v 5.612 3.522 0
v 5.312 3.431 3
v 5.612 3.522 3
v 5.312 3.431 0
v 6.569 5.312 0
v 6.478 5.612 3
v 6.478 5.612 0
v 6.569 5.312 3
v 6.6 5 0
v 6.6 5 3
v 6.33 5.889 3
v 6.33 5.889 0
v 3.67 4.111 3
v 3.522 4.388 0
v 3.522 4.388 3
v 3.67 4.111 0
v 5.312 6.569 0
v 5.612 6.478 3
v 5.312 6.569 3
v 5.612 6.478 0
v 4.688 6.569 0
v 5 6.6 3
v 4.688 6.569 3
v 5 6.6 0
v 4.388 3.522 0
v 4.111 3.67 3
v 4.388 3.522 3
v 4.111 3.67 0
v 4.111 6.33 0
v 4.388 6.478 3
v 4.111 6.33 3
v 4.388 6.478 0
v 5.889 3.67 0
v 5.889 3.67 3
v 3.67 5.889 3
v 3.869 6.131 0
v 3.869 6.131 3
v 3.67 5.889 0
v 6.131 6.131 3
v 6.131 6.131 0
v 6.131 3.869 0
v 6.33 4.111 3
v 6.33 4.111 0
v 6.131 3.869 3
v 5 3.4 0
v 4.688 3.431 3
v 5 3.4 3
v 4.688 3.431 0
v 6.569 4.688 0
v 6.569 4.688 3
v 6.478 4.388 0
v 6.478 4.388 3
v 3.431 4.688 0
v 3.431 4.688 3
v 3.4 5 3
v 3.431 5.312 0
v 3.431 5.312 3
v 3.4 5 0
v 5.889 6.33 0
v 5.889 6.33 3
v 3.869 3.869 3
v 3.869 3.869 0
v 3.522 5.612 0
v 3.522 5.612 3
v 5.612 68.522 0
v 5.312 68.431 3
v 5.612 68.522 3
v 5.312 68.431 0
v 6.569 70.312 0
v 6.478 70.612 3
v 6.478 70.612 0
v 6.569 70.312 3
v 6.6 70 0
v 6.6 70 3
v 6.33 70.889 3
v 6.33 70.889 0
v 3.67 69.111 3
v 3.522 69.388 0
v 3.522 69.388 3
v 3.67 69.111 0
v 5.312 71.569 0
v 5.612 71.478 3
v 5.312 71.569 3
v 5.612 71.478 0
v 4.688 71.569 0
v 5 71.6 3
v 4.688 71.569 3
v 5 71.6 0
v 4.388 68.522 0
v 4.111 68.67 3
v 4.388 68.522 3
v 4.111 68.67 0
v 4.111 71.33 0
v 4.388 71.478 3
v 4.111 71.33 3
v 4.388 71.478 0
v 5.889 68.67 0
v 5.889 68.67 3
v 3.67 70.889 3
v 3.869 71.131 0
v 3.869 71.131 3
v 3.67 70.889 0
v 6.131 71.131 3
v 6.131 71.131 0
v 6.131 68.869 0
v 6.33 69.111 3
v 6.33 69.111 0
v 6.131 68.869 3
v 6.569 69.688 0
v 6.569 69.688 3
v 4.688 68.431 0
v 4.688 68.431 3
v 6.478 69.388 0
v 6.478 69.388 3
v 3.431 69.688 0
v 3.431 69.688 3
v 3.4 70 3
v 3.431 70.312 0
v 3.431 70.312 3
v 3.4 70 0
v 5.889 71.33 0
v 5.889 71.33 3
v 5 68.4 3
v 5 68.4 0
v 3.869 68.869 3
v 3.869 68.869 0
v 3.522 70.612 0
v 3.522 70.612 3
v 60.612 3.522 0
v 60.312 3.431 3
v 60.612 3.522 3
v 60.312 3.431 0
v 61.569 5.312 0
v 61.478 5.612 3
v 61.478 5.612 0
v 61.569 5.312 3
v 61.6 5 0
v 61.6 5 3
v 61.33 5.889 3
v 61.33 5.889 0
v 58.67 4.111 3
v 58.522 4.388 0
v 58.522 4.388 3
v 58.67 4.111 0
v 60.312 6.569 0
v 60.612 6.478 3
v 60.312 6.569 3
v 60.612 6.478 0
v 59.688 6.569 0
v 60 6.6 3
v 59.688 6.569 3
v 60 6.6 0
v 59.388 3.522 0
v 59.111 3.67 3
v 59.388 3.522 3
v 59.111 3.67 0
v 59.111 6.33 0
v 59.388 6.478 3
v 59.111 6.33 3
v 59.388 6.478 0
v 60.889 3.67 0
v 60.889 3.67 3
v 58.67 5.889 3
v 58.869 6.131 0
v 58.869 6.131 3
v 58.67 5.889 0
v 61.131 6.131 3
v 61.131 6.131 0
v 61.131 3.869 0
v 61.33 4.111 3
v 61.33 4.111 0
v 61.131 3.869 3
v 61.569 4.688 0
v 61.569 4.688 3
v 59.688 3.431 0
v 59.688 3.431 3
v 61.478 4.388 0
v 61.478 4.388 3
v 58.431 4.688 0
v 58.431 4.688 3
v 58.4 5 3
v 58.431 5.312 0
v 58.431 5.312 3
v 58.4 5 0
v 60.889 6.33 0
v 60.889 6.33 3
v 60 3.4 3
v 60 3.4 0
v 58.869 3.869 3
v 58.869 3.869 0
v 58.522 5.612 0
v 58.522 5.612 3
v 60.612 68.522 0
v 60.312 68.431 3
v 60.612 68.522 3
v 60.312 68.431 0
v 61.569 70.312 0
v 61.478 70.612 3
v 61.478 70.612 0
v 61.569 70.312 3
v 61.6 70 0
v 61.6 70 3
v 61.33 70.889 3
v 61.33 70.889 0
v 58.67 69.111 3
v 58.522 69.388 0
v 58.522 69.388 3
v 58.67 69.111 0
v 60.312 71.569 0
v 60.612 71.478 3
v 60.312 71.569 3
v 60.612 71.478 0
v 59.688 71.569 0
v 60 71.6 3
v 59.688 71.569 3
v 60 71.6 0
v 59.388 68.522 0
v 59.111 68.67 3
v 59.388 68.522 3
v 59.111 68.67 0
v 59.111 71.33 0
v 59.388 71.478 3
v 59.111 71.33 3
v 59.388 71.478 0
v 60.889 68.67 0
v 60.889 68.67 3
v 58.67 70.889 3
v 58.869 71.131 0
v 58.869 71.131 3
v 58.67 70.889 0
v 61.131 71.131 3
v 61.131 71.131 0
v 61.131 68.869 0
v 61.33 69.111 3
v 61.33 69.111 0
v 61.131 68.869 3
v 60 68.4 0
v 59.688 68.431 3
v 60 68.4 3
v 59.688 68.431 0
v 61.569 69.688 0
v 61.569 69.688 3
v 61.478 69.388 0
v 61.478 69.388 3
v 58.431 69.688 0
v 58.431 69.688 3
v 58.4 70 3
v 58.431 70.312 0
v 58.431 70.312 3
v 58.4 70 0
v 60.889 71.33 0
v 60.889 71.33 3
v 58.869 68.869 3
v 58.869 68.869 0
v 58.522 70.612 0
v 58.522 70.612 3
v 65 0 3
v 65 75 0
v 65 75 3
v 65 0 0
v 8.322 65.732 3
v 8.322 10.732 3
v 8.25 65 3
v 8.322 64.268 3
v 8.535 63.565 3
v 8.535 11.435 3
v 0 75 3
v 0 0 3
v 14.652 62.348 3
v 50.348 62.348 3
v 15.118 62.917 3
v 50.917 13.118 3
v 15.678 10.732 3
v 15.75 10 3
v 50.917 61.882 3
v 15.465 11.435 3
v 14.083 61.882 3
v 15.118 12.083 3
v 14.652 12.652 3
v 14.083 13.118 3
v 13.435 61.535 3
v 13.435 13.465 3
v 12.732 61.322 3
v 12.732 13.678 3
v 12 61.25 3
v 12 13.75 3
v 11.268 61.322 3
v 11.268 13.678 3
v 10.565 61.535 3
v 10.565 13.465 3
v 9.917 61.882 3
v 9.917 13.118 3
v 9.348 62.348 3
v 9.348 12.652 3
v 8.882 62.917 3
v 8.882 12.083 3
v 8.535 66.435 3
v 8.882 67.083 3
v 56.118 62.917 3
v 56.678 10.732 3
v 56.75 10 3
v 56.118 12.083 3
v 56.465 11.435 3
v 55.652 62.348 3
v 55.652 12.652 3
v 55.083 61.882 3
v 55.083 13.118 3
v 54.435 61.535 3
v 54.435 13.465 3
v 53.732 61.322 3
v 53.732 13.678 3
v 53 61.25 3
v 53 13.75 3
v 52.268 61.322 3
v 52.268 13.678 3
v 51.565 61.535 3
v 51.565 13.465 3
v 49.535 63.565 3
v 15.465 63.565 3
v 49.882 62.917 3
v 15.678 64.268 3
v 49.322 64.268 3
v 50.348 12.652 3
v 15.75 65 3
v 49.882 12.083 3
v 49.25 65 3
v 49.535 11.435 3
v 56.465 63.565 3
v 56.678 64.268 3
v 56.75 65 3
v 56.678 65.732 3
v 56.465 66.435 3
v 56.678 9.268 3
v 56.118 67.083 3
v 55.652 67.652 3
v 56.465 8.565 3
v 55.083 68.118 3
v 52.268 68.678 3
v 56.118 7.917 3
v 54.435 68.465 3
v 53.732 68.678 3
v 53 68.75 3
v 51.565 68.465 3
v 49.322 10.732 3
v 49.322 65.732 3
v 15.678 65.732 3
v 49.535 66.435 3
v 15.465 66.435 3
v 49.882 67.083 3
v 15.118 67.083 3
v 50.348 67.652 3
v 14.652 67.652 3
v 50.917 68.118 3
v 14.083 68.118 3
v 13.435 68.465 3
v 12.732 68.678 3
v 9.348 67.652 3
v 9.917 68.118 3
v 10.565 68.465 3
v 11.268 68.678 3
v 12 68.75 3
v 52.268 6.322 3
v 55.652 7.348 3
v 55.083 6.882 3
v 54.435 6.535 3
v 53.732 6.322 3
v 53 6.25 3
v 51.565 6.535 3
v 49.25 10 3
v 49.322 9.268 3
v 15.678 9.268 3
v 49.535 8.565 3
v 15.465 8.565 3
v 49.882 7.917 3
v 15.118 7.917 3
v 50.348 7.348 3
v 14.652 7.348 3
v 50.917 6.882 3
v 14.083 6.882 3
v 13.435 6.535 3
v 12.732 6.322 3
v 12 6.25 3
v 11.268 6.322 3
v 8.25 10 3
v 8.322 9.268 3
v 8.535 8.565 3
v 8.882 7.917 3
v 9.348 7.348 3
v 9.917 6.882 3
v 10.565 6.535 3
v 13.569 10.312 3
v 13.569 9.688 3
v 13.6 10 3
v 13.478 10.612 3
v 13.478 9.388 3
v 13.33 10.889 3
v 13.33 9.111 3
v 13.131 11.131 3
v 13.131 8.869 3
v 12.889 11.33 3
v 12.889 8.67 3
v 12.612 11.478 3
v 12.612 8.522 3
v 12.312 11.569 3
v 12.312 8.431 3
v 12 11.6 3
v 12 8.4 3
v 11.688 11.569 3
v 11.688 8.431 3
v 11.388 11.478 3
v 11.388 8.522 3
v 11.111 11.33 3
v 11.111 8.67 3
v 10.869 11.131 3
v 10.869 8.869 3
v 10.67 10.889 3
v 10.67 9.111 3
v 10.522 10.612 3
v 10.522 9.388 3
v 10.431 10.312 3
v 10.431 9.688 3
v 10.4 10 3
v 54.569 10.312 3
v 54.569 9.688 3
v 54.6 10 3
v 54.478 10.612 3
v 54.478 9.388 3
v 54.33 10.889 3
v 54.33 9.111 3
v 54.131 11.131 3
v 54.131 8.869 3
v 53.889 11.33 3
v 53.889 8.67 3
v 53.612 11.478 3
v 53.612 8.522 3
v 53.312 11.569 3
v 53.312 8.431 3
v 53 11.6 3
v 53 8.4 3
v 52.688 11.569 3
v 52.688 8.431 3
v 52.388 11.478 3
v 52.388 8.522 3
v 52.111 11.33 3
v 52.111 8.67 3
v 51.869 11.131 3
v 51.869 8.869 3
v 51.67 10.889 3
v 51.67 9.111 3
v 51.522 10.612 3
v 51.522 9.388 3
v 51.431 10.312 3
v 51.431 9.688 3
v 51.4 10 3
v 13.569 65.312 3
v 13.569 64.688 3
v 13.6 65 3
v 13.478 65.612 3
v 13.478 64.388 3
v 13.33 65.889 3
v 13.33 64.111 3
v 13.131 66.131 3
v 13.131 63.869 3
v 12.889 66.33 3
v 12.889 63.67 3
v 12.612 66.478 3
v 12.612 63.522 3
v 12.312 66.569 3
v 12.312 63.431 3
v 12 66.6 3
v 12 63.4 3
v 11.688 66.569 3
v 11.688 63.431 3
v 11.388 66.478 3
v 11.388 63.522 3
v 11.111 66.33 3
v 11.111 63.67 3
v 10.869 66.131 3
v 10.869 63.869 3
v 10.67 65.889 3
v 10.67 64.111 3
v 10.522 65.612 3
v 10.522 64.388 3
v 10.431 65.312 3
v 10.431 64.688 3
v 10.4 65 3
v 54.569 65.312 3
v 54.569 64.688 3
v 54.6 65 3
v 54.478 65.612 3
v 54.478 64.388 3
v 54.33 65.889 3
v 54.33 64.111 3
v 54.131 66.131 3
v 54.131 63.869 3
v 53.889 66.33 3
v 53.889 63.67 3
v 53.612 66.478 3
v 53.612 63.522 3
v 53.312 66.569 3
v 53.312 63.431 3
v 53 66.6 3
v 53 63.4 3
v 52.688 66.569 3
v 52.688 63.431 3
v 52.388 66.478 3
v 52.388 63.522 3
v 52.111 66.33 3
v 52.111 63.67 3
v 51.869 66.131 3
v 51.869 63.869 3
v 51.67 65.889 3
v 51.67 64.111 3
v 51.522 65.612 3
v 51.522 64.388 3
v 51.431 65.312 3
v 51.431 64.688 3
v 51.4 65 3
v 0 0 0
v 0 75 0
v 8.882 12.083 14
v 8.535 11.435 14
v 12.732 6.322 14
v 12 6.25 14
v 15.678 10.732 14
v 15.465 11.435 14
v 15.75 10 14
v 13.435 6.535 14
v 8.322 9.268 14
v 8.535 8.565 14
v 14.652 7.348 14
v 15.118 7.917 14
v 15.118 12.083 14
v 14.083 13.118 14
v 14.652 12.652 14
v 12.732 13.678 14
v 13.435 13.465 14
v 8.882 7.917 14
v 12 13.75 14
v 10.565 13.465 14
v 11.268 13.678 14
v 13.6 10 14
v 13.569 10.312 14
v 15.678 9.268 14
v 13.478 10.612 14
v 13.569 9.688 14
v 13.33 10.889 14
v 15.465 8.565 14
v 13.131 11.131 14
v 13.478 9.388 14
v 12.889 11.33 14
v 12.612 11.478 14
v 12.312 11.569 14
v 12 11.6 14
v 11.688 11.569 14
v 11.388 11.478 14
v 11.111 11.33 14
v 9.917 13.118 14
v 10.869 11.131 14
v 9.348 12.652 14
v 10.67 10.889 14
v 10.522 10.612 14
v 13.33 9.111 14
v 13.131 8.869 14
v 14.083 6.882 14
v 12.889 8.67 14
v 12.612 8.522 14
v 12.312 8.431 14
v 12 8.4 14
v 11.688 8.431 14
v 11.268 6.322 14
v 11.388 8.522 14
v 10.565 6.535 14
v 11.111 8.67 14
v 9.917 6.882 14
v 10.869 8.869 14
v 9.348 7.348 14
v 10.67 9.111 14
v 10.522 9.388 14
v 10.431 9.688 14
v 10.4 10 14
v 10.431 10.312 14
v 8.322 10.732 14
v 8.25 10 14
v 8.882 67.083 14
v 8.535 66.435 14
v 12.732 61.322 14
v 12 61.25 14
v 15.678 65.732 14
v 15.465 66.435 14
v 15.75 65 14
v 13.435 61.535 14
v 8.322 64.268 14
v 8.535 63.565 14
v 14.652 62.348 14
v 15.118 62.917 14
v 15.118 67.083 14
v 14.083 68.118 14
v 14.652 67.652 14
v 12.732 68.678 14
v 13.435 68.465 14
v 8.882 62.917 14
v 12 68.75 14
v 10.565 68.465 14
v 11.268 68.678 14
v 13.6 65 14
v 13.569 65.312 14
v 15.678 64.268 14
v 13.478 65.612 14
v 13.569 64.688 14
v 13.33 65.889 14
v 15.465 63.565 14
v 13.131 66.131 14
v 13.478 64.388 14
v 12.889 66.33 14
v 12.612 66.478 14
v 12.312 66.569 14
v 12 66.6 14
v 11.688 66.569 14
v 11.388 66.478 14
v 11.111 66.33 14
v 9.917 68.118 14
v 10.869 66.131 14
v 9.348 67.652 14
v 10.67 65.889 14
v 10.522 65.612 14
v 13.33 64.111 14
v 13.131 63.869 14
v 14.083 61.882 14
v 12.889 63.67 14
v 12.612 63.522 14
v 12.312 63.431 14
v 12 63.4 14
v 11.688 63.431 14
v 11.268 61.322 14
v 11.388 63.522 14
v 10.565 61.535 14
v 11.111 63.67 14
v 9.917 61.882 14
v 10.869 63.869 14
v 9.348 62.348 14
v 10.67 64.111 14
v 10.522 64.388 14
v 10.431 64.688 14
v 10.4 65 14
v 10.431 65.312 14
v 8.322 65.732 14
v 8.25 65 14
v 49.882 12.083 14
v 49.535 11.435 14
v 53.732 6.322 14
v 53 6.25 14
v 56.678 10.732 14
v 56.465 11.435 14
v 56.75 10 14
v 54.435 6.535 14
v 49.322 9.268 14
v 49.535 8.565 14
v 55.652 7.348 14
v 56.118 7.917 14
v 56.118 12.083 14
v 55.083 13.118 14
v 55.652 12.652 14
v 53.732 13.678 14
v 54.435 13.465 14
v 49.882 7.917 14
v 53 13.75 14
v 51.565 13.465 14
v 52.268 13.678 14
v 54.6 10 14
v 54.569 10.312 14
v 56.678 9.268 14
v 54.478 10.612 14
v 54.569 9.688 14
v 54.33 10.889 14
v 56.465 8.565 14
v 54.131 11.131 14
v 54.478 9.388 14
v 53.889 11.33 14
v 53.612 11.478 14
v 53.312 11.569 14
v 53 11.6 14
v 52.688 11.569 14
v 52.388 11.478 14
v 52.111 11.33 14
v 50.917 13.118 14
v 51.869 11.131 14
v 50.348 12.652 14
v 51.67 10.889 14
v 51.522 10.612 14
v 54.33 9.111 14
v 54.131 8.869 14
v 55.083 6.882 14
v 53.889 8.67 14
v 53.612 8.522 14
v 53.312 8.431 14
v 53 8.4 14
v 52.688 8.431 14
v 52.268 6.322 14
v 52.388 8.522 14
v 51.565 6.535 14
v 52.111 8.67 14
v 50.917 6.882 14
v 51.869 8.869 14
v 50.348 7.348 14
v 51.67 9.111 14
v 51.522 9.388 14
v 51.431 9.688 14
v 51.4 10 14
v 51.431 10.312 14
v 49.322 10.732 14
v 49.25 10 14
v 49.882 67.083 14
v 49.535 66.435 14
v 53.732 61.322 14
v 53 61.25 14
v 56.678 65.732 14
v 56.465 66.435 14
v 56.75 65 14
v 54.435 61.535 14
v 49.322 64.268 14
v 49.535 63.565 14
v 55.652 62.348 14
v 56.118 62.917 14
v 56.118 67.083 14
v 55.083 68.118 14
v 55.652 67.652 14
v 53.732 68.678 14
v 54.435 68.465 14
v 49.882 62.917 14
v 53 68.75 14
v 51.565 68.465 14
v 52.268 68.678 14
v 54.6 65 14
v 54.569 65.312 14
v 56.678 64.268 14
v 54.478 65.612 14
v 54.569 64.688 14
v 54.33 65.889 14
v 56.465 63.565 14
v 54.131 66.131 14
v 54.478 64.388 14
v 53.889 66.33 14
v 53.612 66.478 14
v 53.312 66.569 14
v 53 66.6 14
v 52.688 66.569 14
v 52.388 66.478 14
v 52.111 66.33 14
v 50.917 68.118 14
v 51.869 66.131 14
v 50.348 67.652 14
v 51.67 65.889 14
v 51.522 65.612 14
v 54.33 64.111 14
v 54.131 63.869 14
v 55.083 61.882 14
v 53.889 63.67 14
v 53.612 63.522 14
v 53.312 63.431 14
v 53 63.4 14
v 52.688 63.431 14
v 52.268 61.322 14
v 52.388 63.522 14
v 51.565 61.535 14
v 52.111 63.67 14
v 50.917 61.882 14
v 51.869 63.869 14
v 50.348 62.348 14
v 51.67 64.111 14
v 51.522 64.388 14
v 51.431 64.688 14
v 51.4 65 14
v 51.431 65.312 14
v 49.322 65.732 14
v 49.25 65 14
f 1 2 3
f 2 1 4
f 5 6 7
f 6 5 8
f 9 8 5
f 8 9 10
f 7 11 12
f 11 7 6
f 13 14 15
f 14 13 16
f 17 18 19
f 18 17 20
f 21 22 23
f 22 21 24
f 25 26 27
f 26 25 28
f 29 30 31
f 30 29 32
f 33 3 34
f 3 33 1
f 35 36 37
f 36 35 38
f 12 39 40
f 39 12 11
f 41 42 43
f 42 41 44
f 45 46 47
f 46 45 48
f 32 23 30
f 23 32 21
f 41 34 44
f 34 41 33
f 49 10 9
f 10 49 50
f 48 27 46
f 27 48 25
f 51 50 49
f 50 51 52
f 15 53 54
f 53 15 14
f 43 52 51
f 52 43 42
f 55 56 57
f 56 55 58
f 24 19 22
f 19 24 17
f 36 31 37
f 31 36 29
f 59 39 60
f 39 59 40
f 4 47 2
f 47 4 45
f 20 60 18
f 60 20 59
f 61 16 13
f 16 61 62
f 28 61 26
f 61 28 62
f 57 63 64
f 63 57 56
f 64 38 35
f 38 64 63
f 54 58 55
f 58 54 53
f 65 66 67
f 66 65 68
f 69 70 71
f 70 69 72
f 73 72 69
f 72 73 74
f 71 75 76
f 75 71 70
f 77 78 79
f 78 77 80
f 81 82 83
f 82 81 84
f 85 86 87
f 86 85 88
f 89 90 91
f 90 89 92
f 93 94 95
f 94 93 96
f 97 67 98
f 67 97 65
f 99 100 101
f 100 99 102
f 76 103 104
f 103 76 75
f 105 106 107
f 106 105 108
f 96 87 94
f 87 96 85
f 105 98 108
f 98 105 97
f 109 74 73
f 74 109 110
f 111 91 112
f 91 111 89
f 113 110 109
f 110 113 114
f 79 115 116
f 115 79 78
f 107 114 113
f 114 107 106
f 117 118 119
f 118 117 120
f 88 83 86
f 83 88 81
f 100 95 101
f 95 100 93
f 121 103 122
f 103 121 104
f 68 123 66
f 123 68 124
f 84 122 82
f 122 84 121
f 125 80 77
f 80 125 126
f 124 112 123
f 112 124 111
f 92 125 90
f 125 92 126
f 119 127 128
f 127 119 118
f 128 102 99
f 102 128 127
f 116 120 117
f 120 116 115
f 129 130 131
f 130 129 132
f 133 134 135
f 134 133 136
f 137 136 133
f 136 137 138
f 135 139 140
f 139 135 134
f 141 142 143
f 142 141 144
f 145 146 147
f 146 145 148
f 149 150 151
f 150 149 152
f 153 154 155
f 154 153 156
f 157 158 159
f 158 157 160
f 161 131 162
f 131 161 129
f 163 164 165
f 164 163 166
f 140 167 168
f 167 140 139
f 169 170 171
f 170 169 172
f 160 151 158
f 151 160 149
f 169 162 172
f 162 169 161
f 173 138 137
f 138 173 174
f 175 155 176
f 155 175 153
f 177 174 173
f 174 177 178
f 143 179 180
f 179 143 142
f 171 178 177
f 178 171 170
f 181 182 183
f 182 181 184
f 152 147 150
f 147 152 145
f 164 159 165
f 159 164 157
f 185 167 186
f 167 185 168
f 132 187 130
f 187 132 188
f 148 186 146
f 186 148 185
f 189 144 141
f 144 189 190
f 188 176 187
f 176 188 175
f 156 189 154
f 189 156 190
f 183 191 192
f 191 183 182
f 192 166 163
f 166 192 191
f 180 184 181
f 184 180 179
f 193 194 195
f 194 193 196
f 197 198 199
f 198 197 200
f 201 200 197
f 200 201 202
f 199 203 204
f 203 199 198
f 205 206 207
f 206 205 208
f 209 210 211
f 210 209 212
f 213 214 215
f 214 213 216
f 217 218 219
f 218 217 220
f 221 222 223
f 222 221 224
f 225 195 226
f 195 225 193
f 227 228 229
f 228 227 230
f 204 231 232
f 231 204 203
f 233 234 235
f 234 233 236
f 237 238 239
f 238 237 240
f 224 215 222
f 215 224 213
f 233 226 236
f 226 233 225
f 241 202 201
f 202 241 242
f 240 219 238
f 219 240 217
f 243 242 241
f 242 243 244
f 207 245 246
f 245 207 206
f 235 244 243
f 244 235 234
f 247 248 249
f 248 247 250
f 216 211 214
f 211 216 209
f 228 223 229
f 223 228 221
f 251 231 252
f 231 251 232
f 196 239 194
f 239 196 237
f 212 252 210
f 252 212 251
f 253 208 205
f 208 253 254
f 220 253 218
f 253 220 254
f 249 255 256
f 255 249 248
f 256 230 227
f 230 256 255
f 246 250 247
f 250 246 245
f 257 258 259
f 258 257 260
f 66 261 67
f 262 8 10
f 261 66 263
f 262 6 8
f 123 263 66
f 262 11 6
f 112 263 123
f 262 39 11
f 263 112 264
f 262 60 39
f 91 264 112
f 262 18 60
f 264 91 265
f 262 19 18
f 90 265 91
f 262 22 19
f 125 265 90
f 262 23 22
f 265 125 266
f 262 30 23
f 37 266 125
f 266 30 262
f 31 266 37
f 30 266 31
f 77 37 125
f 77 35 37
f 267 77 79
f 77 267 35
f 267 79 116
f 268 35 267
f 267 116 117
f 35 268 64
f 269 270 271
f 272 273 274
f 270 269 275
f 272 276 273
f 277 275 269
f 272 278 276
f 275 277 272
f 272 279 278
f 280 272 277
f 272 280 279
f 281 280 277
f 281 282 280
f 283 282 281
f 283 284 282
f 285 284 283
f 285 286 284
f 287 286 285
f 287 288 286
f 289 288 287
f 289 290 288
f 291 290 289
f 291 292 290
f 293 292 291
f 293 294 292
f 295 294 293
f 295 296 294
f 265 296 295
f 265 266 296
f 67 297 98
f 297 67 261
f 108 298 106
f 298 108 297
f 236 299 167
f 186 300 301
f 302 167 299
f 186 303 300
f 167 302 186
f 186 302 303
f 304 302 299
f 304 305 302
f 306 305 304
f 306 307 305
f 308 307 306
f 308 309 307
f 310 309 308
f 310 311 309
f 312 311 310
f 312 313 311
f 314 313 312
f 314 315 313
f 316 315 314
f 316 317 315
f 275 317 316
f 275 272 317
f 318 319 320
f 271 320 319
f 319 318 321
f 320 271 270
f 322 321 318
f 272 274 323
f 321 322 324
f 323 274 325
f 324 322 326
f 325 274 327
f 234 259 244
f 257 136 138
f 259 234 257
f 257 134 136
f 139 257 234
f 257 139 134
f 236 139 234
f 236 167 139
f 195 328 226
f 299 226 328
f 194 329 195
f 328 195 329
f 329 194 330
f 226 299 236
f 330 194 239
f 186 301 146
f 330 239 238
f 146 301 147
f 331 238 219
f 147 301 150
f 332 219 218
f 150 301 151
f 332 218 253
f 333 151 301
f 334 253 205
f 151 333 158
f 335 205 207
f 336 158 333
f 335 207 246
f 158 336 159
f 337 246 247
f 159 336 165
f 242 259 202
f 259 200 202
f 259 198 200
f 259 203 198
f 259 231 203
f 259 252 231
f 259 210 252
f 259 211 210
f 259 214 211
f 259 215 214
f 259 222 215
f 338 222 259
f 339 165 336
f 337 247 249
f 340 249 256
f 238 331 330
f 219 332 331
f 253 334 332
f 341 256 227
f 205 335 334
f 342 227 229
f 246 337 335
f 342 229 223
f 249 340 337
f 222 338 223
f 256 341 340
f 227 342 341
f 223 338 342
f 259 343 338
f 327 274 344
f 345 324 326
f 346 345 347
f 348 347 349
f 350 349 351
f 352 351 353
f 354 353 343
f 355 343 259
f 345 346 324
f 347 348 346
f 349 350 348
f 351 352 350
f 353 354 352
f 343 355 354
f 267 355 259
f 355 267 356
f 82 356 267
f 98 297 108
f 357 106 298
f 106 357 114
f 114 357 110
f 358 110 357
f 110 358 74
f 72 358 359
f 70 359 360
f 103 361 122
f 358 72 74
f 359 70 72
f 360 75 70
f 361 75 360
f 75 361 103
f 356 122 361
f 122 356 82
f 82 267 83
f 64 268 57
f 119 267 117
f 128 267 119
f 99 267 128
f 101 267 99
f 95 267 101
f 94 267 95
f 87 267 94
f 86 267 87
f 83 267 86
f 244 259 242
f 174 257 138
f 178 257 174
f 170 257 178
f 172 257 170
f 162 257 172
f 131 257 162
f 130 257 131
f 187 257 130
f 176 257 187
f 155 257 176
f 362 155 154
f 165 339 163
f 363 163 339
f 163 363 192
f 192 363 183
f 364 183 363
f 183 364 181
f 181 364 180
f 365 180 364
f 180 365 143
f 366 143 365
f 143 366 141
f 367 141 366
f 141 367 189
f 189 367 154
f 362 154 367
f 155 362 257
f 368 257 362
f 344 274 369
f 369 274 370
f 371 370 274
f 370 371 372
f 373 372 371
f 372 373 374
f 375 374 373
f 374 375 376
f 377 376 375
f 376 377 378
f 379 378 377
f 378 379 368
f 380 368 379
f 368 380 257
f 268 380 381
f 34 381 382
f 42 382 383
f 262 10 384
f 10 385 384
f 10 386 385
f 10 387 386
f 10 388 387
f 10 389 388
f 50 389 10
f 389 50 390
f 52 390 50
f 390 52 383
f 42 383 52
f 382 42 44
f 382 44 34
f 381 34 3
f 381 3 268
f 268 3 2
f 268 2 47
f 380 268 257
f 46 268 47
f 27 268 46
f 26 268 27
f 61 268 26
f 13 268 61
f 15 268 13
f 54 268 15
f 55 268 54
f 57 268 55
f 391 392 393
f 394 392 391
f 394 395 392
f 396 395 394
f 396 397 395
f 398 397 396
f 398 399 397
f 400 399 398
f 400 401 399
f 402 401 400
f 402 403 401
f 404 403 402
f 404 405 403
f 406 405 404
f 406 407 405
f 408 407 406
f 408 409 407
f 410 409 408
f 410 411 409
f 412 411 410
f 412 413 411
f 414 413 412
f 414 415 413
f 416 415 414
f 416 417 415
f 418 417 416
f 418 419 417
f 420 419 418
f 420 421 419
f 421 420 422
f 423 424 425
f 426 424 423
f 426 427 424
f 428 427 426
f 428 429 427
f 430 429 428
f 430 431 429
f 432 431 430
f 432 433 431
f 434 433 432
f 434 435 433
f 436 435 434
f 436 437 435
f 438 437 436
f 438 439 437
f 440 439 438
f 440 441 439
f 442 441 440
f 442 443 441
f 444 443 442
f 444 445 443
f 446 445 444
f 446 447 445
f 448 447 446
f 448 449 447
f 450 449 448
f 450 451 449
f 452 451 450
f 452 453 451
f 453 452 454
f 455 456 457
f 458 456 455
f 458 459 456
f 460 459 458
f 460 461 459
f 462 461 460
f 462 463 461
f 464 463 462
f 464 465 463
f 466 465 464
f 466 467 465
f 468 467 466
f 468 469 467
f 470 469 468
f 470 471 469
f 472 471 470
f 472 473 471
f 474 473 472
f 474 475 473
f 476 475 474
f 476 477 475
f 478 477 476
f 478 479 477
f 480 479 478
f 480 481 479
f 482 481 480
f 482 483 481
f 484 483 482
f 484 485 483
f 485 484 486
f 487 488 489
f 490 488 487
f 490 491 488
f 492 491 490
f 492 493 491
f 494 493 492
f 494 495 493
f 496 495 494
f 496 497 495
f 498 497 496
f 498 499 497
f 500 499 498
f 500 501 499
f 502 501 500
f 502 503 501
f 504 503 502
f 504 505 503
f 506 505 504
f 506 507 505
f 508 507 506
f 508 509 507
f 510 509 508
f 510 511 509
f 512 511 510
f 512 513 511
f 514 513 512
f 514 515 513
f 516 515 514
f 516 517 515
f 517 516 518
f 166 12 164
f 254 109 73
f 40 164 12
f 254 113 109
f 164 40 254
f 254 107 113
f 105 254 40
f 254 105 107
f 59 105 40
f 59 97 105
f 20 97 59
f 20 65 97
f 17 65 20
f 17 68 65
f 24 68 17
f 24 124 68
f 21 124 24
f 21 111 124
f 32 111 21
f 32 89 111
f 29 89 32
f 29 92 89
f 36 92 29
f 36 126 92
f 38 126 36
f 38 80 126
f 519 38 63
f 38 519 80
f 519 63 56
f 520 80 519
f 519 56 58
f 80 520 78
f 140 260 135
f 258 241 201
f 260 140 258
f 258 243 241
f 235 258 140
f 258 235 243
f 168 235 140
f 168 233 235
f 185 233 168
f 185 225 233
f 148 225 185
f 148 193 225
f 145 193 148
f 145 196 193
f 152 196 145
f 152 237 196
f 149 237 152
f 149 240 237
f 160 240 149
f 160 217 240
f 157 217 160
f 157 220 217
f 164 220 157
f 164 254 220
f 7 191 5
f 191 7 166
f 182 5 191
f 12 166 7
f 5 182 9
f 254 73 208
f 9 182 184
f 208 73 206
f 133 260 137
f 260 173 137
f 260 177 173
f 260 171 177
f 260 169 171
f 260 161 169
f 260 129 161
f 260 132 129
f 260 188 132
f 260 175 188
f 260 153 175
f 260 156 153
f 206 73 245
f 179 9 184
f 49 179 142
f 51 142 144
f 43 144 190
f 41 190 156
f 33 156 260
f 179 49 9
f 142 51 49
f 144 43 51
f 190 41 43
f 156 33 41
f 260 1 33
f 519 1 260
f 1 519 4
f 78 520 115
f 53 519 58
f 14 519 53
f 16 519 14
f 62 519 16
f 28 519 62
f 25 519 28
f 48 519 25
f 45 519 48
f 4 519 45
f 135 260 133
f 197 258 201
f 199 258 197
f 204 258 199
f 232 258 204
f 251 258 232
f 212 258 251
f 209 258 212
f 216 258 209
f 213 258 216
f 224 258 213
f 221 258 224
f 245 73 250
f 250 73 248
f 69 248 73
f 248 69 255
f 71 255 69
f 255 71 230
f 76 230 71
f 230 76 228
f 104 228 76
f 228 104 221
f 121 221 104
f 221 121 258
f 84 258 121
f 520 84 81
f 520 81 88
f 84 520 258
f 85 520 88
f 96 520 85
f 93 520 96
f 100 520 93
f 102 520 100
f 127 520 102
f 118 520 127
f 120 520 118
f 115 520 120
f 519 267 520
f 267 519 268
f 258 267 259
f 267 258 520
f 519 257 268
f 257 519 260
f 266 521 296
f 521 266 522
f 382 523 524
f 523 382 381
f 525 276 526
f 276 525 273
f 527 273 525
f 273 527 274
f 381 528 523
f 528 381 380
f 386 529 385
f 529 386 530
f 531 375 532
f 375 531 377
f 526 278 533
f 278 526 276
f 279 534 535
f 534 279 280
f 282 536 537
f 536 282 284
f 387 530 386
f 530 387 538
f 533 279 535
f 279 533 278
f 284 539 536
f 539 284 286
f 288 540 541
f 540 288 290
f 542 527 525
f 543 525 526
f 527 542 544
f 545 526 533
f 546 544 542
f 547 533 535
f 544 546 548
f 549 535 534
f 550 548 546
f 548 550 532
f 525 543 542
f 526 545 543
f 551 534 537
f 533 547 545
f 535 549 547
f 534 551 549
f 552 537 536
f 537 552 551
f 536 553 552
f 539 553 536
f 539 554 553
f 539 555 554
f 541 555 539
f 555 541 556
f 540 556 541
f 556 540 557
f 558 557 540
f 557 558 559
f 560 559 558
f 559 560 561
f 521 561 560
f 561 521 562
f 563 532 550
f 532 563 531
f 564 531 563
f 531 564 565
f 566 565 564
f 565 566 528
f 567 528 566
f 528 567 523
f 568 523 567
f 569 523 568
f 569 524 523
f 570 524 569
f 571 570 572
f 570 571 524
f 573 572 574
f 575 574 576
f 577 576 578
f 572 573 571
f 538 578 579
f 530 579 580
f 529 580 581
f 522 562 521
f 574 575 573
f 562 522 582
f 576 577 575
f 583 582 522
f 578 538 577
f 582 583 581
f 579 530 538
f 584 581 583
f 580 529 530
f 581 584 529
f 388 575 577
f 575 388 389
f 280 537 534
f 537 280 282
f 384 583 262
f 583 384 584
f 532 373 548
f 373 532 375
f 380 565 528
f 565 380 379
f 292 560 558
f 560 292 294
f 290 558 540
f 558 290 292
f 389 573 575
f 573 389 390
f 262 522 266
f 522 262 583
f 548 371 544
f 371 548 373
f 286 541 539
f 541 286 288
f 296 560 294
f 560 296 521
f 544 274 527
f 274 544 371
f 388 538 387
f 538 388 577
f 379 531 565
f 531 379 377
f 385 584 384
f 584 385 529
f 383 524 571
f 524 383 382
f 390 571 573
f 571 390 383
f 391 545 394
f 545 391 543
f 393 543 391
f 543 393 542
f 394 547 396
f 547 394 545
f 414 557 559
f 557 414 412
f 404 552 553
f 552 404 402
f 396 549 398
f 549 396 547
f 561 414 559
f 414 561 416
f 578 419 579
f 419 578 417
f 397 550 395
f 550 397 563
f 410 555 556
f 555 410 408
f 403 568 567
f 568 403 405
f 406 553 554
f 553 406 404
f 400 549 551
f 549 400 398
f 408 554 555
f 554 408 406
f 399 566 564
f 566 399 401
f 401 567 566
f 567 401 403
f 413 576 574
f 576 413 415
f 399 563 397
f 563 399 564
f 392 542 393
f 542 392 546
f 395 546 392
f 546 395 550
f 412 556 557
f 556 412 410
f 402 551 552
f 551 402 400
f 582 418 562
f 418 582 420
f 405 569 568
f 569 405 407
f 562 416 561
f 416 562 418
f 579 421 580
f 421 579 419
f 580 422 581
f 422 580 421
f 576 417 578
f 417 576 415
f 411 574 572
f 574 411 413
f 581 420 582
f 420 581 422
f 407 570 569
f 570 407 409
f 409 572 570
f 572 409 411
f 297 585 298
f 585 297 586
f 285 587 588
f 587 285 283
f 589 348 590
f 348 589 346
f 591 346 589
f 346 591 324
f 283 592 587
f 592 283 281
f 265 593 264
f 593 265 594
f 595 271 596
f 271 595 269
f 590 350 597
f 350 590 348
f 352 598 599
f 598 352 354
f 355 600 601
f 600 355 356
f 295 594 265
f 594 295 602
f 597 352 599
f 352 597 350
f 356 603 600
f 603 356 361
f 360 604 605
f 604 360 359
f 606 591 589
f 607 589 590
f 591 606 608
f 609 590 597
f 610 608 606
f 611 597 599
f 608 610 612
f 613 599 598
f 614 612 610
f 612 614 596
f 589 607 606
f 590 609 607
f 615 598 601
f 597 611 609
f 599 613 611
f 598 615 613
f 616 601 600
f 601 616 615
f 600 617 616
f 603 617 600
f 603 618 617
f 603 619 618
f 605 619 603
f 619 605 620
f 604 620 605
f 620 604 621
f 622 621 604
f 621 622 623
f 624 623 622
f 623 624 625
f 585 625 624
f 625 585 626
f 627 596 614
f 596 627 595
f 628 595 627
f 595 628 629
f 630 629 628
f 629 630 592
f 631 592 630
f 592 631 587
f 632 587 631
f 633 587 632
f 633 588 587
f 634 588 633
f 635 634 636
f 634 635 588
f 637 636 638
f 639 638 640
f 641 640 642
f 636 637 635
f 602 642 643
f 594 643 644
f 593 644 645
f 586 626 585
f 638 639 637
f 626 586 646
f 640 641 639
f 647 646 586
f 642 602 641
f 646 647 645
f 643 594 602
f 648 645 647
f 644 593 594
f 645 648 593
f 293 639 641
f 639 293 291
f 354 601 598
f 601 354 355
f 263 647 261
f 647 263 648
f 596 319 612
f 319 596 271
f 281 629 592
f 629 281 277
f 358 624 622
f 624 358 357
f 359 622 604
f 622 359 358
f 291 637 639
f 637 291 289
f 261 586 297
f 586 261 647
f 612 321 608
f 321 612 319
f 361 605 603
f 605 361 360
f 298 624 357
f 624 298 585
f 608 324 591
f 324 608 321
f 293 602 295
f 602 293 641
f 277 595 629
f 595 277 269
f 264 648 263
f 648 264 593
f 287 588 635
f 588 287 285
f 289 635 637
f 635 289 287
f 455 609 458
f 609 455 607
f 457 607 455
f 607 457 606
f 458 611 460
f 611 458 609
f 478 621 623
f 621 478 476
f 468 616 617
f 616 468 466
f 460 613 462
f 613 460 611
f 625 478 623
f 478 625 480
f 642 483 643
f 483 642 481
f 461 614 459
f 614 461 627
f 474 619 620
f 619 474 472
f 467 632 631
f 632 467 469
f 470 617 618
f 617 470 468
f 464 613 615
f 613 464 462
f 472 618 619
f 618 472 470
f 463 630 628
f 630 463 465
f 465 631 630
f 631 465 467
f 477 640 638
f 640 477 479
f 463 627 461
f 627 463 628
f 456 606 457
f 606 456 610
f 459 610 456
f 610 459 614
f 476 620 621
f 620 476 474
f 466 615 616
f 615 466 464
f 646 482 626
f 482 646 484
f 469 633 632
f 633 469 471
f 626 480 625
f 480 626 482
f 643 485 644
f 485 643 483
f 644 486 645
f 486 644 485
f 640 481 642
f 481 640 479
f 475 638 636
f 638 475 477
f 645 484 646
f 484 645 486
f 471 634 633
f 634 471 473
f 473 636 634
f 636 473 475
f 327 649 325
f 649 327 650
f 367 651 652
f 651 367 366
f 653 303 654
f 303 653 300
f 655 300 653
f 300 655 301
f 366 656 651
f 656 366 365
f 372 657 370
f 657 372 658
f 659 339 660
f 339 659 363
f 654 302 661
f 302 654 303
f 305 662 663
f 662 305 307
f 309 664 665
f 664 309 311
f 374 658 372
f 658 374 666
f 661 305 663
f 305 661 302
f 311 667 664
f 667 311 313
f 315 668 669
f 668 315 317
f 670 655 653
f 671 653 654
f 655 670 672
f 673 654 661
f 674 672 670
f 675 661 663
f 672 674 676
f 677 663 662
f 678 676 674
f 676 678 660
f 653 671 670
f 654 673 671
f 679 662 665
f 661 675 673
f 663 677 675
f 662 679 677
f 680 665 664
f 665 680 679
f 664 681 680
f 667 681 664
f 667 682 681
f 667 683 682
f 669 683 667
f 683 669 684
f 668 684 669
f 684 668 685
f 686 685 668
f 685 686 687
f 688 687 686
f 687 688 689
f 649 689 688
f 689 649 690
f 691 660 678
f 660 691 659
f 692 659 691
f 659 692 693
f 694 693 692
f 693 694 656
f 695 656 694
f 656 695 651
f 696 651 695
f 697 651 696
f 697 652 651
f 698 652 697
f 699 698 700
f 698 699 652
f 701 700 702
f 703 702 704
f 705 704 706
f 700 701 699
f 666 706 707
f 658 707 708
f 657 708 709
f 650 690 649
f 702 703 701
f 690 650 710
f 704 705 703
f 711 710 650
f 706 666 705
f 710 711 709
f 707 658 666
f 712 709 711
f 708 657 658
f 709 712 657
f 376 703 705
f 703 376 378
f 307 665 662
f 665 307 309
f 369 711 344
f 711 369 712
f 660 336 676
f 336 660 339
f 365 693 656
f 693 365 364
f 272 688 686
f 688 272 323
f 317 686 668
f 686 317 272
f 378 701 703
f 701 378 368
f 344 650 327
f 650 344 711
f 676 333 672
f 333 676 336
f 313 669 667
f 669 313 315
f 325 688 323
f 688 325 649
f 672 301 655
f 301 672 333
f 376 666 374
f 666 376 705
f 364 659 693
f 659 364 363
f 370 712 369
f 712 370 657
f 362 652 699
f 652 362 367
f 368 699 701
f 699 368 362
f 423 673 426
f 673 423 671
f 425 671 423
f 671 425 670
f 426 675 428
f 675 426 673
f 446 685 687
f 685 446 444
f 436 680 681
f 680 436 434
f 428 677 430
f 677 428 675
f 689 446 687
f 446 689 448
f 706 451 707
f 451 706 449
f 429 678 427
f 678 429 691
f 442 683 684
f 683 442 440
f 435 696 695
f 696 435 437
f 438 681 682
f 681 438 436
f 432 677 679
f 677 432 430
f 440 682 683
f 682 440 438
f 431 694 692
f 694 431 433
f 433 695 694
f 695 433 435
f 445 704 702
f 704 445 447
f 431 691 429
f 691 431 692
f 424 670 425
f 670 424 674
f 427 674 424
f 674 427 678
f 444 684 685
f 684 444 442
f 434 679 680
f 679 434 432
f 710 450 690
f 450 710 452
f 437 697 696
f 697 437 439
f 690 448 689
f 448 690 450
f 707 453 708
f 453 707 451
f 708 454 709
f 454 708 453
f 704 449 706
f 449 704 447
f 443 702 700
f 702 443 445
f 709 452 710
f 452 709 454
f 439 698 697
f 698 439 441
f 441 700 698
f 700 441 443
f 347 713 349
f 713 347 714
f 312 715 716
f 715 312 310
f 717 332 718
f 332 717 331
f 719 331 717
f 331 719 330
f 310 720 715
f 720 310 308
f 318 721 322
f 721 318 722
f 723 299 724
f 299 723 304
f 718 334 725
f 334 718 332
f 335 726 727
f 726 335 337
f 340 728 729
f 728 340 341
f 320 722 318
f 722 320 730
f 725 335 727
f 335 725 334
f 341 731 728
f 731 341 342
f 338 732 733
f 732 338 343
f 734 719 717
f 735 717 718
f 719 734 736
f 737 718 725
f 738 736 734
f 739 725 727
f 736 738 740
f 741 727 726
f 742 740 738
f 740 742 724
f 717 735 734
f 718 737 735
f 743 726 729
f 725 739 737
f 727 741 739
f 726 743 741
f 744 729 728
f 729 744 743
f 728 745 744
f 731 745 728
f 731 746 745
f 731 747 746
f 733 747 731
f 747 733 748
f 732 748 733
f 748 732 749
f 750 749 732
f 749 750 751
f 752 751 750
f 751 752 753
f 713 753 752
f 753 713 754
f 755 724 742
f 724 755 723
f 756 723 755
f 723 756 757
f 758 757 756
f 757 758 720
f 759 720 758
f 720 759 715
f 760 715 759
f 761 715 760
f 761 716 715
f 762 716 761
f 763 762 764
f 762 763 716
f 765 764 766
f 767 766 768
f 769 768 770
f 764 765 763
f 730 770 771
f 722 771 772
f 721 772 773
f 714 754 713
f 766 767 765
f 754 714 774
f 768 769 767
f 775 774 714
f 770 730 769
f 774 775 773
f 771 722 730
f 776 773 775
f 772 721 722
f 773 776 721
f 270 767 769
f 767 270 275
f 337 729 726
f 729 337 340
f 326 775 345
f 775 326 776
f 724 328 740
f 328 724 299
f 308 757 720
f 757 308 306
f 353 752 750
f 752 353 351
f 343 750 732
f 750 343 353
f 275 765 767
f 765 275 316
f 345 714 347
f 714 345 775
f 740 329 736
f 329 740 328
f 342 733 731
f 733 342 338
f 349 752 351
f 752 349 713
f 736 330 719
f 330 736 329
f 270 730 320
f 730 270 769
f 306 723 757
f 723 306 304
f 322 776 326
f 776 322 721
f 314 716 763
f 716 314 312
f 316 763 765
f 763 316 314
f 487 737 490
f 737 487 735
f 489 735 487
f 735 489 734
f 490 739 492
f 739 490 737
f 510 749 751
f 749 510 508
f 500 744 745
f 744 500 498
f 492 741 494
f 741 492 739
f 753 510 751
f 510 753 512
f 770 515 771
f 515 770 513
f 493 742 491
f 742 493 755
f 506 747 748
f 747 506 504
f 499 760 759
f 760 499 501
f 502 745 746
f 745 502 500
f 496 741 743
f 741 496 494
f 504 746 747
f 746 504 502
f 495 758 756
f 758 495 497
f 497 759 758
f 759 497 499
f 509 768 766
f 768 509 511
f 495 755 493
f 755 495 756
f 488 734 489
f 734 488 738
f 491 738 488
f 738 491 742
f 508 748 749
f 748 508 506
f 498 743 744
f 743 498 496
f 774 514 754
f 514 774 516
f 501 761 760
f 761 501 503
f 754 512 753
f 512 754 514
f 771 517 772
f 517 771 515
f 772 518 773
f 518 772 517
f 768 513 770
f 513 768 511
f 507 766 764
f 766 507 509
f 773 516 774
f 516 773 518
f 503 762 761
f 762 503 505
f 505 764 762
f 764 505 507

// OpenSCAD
$fn = 32;
// Enclosure base with four PCB standoffs.

width = 65;
depth = 75;
base_t = 3;
post_h = 11;
post_d = 7.5;
post_bore = 3.2;
pcb_x = 41;
pcb_y = 55;

union() {
    difference() {
        cube([width, depth, base_t]);
        for (x = [5, width - 5], y = [5, depth - 5])
            translate([x, y, -1]) cylinder(h = base_t + 2, d = 3.2);
    }
    for (dx = [-pcb_x / 2, pcb_x / 2], dy = [-pcb_y / 2, pcb_y / 2])
        translate([width / 2 + dx, depth / 2 + dy, base_t])
            difference() {
                cylinder(h = post_h, d = post_d);
                translate([0, 0, -1])
                    cylinder(h = post_h + 2, d = post_bore);
            }
}
